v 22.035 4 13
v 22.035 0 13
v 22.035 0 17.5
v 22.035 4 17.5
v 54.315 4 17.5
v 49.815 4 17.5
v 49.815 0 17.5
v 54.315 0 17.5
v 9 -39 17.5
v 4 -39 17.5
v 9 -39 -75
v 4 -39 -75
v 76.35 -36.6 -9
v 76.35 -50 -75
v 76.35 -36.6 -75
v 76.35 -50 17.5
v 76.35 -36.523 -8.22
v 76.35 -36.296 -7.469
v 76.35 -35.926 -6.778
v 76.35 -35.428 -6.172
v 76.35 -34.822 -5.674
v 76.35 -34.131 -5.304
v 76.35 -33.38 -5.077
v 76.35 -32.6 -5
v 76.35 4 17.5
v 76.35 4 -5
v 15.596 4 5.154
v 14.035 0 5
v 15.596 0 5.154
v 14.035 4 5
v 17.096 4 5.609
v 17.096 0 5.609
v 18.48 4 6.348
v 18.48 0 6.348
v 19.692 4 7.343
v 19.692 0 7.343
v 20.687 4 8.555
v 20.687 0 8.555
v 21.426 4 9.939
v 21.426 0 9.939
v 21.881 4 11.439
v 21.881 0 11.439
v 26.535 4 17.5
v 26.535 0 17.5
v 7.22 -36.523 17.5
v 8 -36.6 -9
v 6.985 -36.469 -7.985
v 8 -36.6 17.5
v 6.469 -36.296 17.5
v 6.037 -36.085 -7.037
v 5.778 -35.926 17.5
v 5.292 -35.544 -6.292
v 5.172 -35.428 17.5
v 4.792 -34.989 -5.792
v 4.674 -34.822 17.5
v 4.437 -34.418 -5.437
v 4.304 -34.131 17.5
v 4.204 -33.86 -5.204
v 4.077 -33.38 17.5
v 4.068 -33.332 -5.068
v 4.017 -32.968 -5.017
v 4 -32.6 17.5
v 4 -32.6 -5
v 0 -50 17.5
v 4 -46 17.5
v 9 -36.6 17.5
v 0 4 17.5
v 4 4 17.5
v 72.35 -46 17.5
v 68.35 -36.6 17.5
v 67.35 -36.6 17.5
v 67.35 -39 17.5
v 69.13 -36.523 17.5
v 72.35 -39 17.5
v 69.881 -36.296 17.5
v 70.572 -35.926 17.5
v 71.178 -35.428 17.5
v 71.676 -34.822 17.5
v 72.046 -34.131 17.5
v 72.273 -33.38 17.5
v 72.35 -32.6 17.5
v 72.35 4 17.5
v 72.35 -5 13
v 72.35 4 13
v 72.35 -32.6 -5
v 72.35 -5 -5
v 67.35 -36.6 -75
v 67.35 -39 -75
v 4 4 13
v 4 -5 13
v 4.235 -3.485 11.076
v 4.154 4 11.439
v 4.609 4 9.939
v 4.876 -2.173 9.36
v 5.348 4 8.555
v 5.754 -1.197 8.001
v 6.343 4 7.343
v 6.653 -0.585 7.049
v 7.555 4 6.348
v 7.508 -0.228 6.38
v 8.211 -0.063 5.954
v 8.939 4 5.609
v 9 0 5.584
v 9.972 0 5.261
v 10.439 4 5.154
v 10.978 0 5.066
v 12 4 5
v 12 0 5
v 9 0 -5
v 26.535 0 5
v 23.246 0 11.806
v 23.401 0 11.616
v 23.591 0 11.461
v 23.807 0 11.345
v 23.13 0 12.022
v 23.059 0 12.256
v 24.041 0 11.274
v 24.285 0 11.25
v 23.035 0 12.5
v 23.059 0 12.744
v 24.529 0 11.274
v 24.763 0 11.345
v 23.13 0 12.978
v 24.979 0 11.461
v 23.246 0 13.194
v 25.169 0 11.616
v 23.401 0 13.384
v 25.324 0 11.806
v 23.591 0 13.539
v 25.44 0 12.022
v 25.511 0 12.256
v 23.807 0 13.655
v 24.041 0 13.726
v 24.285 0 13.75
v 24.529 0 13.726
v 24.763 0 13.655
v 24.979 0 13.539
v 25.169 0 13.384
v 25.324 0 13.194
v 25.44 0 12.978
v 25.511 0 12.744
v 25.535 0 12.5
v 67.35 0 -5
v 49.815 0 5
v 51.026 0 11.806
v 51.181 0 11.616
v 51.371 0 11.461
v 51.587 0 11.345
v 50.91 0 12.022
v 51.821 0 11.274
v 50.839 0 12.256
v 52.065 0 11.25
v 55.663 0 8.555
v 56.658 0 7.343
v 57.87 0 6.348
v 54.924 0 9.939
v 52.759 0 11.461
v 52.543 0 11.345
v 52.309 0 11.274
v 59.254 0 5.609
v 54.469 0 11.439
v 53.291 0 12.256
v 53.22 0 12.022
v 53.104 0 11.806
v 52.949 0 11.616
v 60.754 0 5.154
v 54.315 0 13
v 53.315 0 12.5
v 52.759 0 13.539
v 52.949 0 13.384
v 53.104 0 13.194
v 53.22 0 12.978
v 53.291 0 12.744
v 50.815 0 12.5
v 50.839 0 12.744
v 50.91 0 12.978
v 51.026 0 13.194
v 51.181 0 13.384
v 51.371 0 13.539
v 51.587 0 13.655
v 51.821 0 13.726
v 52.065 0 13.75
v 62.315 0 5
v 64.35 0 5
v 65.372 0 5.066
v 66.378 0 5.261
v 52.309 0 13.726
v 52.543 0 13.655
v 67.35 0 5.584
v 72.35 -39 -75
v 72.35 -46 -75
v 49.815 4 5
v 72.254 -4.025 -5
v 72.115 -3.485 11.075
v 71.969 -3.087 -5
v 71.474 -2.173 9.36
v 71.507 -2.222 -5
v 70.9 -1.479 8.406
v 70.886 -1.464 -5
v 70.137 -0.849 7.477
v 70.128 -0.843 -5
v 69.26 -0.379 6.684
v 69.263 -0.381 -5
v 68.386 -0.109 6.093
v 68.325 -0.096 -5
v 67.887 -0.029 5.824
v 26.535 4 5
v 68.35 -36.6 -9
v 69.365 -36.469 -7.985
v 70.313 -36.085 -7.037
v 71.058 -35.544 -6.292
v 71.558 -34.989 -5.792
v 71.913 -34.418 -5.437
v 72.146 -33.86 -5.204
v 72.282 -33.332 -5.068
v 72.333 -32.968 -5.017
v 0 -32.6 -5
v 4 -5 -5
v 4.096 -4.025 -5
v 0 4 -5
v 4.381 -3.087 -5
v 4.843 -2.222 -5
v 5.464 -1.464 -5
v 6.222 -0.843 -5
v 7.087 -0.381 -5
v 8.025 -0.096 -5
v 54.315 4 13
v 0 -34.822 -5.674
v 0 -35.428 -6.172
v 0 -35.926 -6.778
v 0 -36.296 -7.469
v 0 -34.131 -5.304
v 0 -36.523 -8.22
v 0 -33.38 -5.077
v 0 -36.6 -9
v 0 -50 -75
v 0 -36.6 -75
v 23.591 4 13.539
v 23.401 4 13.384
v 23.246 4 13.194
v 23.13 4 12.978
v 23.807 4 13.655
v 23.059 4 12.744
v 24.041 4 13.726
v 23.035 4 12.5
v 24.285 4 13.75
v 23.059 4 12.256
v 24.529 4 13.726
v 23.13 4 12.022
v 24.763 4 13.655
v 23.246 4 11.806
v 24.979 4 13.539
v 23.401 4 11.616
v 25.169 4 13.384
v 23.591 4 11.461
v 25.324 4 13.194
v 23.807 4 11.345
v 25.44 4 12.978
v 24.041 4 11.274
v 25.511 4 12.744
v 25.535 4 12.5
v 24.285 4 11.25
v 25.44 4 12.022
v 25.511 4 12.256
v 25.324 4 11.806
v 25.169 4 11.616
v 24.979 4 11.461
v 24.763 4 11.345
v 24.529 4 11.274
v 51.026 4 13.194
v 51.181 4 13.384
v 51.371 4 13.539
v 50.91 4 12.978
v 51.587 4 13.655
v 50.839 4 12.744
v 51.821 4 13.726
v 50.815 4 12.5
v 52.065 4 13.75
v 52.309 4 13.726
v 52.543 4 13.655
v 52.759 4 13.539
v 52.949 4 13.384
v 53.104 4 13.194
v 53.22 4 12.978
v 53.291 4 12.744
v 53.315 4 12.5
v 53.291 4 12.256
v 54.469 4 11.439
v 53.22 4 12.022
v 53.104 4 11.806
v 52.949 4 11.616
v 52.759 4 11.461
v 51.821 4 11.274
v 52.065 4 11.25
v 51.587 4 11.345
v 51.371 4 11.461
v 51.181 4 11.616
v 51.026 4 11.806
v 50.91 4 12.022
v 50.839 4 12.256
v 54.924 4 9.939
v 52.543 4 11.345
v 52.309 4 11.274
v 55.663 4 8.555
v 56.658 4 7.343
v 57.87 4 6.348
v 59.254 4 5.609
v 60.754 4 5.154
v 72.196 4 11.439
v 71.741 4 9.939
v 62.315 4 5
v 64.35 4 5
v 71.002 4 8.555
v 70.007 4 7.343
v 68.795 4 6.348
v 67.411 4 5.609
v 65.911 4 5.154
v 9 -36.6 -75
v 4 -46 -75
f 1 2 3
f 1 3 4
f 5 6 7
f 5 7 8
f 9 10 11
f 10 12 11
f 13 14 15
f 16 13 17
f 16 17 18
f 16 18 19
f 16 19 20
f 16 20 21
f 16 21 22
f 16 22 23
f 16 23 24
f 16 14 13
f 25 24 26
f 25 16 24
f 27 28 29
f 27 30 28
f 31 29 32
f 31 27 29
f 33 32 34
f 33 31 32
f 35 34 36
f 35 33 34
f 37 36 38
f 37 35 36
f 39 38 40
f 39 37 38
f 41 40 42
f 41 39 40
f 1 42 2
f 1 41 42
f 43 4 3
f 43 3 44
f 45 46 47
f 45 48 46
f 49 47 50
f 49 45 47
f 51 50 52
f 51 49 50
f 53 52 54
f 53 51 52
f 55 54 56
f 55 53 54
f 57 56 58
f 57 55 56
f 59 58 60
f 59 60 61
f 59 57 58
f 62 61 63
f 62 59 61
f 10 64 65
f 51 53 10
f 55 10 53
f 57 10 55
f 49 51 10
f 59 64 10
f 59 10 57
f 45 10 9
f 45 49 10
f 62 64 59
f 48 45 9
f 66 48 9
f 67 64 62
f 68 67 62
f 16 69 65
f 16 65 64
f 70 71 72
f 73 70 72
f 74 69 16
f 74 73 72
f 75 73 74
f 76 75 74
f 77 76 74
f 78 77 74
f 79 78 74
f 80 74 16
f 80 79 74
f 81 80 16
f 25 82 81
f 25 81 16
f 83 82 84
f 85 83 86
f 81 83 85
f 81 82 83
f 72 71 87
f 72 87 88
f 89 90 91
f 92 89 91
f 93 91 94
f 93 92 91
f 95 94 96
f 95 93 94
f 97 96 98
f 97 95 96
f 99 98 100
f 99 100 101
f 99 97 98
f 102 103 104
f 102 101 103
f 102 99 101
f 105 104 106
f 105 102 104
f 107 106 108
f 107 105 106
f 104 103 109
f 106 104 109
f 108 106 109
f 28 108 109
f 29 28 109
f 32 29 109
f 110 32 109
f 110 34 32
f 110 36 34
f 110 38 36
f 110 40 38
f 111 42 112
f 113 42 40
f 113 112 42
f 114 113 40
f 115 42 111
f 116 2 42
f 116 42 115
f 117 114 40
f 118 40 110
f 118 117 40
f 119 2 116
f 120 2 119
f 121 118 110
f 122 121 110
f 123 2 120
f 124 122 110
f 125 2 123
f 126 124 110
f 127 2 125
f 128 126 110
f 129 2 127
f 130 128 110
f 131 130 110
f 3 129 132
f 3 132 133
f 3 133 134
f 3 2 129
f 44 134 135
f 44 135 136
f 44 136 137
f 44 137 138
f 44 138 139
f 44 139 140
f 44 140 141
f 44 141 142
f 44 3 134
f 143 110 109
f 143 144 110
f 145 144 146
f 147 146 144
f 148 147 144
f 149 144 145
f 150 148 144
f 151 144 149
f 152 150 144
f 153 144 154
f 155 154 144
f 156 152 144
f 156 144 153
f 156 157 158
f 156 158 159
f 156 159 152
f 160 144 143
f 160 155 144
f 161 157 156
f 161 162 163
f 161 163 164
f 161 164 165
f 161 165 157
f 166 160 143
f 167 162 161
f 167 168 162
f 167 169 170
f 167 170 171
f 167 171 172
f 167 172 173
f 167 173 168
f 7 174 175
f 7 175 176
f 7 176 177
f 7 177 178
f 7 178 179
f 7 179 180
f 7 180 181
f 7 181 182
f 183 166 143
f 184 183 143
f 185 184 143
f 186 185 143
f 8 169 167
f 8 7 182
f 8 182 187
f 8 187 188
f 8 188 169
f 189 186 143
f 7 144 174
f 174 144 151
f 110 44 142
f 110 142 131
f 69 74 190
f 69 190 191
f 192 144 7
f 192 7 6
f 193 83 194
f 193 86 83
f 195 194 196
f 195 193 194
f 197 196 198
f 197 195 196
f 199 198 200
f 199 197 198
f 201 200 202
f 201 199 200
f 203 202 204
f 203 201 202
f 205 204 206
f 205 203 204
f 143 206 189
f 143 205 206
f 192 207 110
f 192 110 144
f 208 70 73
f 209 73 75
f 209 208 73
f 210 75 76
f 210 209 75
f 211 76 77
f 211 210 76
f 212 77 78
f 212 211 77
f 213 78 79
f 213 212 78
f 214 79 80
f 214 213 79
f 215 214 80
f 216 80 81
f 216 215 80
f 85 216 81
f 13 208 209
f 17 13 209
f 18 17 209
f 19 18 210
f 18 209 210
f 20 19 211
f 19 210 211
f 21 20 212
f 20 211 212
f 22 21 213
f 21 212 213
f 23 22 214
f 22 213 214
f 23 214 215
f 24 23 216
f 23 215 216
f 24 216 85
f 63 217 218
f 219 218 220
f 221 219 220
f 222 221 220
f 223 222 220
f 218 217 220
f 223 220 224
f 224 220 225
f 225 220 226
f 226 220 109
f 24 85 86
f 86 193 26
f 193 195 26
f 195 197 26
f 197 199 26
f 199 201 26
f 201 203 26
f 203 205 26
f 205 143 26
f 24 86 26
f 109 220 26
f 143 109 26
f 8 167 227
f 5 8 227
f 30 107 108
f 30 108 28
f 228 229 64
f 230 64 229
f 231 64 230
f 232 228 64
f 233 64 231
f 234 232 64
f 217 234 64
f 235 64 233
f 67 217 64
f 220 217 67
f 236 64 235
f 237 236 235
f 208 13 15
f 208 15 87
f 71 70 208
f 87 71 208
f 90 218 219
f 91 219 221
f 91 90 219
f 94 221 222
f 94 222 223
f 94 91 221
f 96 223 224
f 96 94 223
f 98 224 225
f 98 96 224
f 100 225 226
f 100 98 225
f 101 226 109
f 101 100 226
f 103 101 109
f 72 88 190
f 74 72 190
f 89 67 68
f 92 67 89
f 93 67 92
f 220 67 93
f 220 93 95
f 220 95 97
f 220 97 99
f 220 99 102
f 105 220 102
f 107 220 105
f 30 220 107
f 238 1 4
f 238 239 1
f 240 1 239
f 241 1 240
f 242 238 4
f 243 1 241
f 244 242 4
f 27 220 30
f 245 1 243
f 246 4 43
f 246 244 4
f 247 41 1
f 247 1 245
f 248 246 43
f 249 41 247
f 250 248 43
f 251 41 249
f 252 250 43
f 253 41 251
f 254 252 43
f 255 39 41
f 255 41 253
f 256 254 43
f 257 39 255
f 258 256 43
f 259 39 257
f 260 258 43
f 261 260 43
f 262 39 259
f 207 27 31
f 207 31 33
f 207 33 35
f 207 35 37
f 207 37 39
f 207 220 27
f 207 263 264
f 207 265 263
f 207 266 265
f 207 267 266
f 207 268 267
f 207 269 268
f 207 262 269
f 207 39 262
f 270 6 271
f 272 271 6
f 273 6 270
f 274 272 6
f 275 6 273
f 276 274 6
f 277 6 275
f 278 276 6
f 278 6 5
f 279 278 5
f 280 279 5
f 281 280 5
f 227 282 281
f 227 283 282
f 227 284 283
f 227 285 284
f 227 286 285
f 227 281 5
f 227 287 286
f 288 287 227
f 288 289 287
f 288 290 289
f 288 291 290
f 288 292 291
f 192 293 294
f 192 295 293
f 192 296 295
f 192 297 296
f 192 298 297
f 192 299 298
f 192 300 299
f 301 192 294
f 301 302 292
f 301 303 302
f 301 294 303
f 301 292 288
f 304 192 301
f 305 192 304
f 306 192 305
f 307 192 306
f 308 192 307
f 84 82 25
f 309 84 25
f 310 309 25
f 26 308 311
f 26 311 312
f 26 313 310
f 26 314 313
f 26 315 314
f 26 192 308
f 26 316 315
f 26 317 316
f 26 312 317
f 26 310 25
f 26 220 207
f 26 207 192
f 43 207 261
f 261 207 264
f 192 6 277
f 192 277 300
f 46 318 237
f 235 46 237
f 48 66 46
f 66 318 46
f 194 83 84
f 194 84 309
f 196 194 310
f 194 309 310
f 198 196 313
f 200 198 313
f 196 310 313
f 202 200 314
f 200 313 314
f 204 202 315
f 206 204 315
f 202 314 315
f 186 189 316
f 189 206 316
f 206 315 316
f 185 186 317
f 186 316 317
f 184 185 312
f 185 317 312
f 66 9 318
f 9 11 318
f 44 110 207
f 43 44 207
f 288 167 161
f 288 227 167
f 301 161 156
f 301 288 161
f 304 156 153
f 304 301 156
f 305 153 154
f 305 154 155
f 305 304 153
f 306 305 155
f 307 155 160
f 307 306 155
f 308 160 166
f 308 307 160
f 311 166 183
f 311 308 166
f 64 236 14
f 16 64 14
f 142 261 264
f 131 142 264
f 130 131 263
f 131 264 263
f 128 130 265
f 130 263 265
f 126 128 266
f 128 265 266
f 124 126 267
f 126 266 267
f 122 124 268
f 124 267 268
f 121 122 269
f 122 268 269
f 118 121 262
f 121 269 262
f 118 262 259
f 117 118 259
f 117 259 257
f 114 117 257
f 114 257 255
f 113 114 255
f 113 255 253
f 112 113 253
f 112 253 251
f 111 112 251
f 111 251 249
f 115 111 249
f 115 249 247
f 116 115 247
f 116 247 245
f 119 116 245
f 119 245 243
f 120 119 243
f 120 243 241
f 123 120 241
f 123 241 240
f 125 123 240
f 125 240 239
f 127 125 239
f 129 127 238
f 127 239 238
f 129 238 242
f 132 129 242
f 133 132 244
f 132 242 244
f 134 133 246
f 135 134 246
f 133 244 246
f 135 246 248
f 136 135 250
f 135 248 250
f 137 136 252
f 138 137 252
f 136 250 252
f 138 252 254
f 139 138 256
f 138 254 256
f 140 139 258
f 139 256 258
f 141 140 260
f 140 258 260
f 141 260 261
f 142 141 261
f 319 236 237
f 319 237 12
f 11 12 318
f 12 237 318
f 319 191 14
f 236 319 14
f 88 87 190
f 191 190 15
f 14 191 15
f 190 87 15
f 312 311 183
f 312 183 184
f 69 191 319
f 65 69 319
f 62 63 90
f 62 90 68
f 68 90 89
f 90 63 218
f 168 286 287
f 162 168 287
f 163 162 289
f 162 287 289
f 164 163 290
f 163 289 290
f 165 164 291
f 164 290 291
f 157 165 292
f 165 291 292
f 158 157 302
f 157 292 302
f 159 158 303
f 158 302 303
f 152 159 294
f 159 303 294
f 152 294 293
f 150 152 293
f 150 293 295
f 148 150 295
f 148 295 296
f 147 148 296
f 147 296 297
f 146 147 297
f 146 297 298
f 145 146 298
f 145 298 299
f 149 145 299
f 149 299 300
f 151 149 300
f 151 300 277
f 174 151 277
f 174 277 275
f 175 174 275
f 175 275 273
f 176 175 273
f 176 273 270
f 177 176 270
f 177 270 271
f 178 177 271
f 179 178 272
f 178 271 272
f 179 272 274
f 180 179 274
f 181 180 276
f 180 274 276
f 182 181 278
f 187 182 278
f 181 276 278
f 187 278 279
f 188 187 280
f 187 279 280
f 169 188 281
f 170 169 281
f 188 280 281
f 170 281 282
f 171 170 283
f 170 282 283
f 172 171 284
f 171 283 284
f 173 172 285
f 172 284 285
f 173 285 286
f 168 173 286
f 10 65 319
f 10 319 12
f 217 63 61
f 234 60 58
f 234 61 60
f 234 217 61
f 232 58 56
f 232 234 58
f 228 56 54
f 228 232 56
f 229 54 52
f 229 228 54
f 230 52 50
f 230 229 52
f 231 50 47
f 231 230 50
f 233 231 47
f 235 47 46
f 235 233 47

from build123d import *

# Parameters (mm, degrees)
EXTRUDE_7_DEPTH      = 5
EXTRUDE_7_DEPTH_BACK = 5
SKETCH_1_W           = 76.35
SKETCH_1_H           = 54
EXTRUDE_8_DEPTH      = 12.5
EXTRUDE_8_DEPTH_BACK = 80
SKETCH_3_W           = 4.5
SKETCH_3_H           = 4
SKETCH_3_W_2         = 4
SKETCH_3_H_2         = 40.6
EXTRUDE_9_DEPTH      = 12.5
SKETCH_5_R           = 1.25
CUT_EXTRUDE_1_DEPTH  = 12.5
FILLET_1_R           = 4
FILLET_2_R           = 4
FILLET_3_R           = 8
FILLET_4_R           = 8
FILLET_5_R           = 8
FILLET_6_R           = 8
FILLET_7_R           = 5
FILLET_8_R           = 5
FILLET_9_R           = 4
FILLET_10_R          = 4


with BuildPart() as part:
    # Эскиз1 → Бобышка-Вытянуть7 (new, two sides: drawn at the far end of the back side and taken through both)
    with BuildSketch(Plane.XY.offset(-EXTRUDE_7_DEPTH_BACK)):
        with Locations((38.175, -23)):
            Rectangle(SKETCH_1_W, SKETCH_1_H)
        Polygon((72.35, 0), (72.35, -36.6), (67.35, -36.6), (67.35, -39), (72.35, -39), (72.35, -46), (4, -46), (4, -39), (9, -39), (9, -36.6), (4, -36.6), (4, 0), align=None, mode=Mode.SUBTRACT)
    extrude(amount=EXTRUDE_7_DEPTH + EXTRUDE_7_DEPTH_BACK)

    # Эскиз2 → Бобышка-Вытянуть8 (add, two sides: drawn at the far end of the back side and taken through both)
    with BuildSketch(Plane.XY.offset(5).offset(-EXTRUDE_8_DEPTH_BACK)):
        Polygon((4, -46), (4, -39), (9, -39), (9, -36.6), (4, -36.6), (0, -36.6), (0, -50), (76.35, -50), (76.35, -36.6), (72.35, -36.6), (67.35, -36.6), (67.35, -39), (72.35, -39), (72.35, -46), align=None)
    extrude(amount=EXTRUDE_8_DEPTH + EXTRUDE_8_DEPTH_BACK)

    # Эскиз3 → Бобышка-Вытянуть9 (add)
    with BuildSketch(Plane.XY.offset(5)):
        with Locations((52.065, 2)):
            Rectangle(SKETCH_3_W, SKETCH_3_H)
        with Locations((24.285, 2)):
            Rectangle(SKETCH_3_W, SKETCH_3_H)
        with Locations((2, -16.3)):
            Rectangle(SKETCH_3_W_2, SKETCH_3_H_2)
        with Locations((74.35, -16.3)):
            Rectangle(SKETCH_3_W_2, SKETCH_3_H_2)
    extrude(amount=EXTRUDE_9_DEPTH)

    # Эскиз5 → Вырез-Вытянуть1 (cut)
    with BuildSketch(Plane(origin=(0, 4, 0), x_dir=(1, 0, 0), z_dir=(0, 1, 0))):
        with Locations((24.285, -12.5)):
            Circle(SKETCH_5_R)
        with Locations((52.065, -12.5)):
            Circle(SKETCH_5_R)
    extrude(amount=-CUT_EXTRUDE_1_DEPTH, mode=Mode.SUBTRACT)

    # Скругление1
    fillet_1_edges = [part.edges().sort_by_distance(p)[0] for p in [
        (2, -36.6, -5),
    ]]
    fillet(fillet_1_edges, radius=FILLET_1_R)

    # Скругление2
    fillet_2_edges = [part.edges().sort_by_distance(p)[0] for p in [
        (74.35, -36.6, -5),
    ]]
    fillet(fillet_2_edges, radius=FILLET_2_R)

    # Скругление3
    fillet_3_edges = [part.edges().sort_by_distance(p)[0] for p in [
        (4, 2, 5),
    ]]
    fillet(fillet_3_edges, radius=FILLET_3_R)

    # Скругление4
    fillet_4_edges = [part.edges().sort_by_distance(p)[0] for p in [
        (72.35, 2, 5),
    ]]
    fillet(fillet_4_edges, radius=FILLET_4_R)

    # Скругление5
    fillet_5_edges = [part.edges().sort_by_distance(p)[0] for p in [
        (22.035, 2, 5),
    ]]
    fillet(fillet_5_edges, radius=FILLET_5_R)

    # Скругление6
    fillet_6_edges = [part.edges().sort_by_distance(p)[0] for p in [
        (54.315, 2, 5),
    ]]
    fillet(fillet_6_edges, radius=FILLET_6_R)

    # Скругление7
    fillet_7_edges = [part.edges().sort_by_distance(p)[0] for p in [
        (72.35, 0, 4),
    ]]
    fillet(fillet_7_edges, radius=FILLET_7_R)

    # Скругление8
    fillet_8_edges = [part.edges().sort_by_distance(p)[0] for p in [
        (4, 0, 4),
    ]]
    fillet(fillet_8_edges, radius=FILLET_8_R)

    # Скругление9
    fillet_9_edges = [part.edges().sort_by_distance(p)[0] for p in [
        (4, -36.6, 4.25),
    ]]
    fillet(fillet_9_edges, radius=FILLET_9_R)

    # Скругление10
    fillet_10_edges = [part.edges().sort_by_distance(p)[0] for p in [
        (72.35, -36.6, 4.25),
    ]]
    fillet(fillet_10_edges, radius=FILLET_10_R)


solid = part.part
